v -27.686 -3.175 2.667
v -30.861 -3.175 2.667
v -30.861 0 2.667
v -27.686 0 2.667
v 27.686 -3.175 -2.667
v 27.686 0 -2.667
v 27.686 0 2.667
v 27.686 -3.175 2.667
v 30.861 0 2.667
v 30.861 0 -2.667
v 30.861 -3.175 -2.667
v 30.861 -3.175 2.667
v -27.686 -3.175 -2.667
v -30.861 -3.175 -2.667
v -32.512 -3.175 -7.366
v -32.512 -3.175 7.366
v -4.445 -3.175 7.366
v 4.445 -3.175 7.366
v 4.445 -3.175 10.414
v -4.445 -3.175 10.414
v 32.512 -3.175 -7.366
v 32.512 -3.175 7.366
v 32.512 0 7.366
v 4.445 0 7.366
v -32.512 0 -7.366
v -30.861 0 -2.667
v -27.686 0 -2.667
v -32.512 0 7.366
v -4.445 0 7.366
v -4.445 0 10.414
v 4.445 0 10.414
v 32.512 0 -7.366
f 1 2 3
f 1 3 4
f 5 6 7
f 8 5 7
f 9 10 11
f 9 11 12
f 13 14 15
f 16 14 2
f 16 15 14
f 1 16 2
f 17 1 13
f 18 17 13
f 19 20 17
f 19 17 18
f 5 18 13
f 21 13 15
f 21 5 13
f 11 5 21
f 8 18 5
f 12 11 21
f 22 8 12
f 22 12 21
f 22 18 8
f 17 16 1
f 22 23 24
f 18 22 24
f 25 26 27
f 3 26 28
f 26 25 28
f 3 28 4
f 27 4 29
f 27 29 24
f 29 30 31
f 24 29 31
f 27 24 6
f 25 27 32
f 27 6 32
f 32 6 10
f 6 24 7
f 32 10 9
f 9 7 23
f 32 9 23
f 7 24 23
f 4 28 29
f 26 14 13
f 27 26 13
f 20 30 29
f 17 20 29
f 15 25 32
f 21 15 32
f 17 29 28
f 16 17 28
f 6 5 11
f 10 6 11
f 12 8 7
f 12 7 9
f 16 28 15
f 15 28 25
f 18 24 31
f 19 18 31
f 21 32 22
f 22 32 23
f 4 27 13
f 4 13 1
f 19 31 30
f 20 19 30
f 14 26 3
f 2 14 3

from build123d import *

# Parameters (mm, degrees)
F0_W     = 3.175
F0_H     = 5.334
F1_DEPTH = 3.175


with BuildPart() as f1:
    # F0 (on Front) → F1 (new body)
    with BuildSketch(Plane.XZ):
        Polygon((-32.512, 7.366), (-32.512, -7.366), (-12.827, -7.366), (18.288, -7.366), (32.512, -7.366), (32.512, 7.366), (4.445, 7.366), (4.445, 10.414), (-4.445, 10.414), (-4.445, 7.366), align=None)
        with Locations((-29.2735, 0)):
            Rectangle(F0_W, F0_H, mode=Mode.SUBTRACT)
        with Locations((29.2735, 0)):
            Rectangle(F0_W, F0_H, mode=Mode.SUBTRACT)
    extrude(amount=F1_DEPTH)


solid = f1.part
